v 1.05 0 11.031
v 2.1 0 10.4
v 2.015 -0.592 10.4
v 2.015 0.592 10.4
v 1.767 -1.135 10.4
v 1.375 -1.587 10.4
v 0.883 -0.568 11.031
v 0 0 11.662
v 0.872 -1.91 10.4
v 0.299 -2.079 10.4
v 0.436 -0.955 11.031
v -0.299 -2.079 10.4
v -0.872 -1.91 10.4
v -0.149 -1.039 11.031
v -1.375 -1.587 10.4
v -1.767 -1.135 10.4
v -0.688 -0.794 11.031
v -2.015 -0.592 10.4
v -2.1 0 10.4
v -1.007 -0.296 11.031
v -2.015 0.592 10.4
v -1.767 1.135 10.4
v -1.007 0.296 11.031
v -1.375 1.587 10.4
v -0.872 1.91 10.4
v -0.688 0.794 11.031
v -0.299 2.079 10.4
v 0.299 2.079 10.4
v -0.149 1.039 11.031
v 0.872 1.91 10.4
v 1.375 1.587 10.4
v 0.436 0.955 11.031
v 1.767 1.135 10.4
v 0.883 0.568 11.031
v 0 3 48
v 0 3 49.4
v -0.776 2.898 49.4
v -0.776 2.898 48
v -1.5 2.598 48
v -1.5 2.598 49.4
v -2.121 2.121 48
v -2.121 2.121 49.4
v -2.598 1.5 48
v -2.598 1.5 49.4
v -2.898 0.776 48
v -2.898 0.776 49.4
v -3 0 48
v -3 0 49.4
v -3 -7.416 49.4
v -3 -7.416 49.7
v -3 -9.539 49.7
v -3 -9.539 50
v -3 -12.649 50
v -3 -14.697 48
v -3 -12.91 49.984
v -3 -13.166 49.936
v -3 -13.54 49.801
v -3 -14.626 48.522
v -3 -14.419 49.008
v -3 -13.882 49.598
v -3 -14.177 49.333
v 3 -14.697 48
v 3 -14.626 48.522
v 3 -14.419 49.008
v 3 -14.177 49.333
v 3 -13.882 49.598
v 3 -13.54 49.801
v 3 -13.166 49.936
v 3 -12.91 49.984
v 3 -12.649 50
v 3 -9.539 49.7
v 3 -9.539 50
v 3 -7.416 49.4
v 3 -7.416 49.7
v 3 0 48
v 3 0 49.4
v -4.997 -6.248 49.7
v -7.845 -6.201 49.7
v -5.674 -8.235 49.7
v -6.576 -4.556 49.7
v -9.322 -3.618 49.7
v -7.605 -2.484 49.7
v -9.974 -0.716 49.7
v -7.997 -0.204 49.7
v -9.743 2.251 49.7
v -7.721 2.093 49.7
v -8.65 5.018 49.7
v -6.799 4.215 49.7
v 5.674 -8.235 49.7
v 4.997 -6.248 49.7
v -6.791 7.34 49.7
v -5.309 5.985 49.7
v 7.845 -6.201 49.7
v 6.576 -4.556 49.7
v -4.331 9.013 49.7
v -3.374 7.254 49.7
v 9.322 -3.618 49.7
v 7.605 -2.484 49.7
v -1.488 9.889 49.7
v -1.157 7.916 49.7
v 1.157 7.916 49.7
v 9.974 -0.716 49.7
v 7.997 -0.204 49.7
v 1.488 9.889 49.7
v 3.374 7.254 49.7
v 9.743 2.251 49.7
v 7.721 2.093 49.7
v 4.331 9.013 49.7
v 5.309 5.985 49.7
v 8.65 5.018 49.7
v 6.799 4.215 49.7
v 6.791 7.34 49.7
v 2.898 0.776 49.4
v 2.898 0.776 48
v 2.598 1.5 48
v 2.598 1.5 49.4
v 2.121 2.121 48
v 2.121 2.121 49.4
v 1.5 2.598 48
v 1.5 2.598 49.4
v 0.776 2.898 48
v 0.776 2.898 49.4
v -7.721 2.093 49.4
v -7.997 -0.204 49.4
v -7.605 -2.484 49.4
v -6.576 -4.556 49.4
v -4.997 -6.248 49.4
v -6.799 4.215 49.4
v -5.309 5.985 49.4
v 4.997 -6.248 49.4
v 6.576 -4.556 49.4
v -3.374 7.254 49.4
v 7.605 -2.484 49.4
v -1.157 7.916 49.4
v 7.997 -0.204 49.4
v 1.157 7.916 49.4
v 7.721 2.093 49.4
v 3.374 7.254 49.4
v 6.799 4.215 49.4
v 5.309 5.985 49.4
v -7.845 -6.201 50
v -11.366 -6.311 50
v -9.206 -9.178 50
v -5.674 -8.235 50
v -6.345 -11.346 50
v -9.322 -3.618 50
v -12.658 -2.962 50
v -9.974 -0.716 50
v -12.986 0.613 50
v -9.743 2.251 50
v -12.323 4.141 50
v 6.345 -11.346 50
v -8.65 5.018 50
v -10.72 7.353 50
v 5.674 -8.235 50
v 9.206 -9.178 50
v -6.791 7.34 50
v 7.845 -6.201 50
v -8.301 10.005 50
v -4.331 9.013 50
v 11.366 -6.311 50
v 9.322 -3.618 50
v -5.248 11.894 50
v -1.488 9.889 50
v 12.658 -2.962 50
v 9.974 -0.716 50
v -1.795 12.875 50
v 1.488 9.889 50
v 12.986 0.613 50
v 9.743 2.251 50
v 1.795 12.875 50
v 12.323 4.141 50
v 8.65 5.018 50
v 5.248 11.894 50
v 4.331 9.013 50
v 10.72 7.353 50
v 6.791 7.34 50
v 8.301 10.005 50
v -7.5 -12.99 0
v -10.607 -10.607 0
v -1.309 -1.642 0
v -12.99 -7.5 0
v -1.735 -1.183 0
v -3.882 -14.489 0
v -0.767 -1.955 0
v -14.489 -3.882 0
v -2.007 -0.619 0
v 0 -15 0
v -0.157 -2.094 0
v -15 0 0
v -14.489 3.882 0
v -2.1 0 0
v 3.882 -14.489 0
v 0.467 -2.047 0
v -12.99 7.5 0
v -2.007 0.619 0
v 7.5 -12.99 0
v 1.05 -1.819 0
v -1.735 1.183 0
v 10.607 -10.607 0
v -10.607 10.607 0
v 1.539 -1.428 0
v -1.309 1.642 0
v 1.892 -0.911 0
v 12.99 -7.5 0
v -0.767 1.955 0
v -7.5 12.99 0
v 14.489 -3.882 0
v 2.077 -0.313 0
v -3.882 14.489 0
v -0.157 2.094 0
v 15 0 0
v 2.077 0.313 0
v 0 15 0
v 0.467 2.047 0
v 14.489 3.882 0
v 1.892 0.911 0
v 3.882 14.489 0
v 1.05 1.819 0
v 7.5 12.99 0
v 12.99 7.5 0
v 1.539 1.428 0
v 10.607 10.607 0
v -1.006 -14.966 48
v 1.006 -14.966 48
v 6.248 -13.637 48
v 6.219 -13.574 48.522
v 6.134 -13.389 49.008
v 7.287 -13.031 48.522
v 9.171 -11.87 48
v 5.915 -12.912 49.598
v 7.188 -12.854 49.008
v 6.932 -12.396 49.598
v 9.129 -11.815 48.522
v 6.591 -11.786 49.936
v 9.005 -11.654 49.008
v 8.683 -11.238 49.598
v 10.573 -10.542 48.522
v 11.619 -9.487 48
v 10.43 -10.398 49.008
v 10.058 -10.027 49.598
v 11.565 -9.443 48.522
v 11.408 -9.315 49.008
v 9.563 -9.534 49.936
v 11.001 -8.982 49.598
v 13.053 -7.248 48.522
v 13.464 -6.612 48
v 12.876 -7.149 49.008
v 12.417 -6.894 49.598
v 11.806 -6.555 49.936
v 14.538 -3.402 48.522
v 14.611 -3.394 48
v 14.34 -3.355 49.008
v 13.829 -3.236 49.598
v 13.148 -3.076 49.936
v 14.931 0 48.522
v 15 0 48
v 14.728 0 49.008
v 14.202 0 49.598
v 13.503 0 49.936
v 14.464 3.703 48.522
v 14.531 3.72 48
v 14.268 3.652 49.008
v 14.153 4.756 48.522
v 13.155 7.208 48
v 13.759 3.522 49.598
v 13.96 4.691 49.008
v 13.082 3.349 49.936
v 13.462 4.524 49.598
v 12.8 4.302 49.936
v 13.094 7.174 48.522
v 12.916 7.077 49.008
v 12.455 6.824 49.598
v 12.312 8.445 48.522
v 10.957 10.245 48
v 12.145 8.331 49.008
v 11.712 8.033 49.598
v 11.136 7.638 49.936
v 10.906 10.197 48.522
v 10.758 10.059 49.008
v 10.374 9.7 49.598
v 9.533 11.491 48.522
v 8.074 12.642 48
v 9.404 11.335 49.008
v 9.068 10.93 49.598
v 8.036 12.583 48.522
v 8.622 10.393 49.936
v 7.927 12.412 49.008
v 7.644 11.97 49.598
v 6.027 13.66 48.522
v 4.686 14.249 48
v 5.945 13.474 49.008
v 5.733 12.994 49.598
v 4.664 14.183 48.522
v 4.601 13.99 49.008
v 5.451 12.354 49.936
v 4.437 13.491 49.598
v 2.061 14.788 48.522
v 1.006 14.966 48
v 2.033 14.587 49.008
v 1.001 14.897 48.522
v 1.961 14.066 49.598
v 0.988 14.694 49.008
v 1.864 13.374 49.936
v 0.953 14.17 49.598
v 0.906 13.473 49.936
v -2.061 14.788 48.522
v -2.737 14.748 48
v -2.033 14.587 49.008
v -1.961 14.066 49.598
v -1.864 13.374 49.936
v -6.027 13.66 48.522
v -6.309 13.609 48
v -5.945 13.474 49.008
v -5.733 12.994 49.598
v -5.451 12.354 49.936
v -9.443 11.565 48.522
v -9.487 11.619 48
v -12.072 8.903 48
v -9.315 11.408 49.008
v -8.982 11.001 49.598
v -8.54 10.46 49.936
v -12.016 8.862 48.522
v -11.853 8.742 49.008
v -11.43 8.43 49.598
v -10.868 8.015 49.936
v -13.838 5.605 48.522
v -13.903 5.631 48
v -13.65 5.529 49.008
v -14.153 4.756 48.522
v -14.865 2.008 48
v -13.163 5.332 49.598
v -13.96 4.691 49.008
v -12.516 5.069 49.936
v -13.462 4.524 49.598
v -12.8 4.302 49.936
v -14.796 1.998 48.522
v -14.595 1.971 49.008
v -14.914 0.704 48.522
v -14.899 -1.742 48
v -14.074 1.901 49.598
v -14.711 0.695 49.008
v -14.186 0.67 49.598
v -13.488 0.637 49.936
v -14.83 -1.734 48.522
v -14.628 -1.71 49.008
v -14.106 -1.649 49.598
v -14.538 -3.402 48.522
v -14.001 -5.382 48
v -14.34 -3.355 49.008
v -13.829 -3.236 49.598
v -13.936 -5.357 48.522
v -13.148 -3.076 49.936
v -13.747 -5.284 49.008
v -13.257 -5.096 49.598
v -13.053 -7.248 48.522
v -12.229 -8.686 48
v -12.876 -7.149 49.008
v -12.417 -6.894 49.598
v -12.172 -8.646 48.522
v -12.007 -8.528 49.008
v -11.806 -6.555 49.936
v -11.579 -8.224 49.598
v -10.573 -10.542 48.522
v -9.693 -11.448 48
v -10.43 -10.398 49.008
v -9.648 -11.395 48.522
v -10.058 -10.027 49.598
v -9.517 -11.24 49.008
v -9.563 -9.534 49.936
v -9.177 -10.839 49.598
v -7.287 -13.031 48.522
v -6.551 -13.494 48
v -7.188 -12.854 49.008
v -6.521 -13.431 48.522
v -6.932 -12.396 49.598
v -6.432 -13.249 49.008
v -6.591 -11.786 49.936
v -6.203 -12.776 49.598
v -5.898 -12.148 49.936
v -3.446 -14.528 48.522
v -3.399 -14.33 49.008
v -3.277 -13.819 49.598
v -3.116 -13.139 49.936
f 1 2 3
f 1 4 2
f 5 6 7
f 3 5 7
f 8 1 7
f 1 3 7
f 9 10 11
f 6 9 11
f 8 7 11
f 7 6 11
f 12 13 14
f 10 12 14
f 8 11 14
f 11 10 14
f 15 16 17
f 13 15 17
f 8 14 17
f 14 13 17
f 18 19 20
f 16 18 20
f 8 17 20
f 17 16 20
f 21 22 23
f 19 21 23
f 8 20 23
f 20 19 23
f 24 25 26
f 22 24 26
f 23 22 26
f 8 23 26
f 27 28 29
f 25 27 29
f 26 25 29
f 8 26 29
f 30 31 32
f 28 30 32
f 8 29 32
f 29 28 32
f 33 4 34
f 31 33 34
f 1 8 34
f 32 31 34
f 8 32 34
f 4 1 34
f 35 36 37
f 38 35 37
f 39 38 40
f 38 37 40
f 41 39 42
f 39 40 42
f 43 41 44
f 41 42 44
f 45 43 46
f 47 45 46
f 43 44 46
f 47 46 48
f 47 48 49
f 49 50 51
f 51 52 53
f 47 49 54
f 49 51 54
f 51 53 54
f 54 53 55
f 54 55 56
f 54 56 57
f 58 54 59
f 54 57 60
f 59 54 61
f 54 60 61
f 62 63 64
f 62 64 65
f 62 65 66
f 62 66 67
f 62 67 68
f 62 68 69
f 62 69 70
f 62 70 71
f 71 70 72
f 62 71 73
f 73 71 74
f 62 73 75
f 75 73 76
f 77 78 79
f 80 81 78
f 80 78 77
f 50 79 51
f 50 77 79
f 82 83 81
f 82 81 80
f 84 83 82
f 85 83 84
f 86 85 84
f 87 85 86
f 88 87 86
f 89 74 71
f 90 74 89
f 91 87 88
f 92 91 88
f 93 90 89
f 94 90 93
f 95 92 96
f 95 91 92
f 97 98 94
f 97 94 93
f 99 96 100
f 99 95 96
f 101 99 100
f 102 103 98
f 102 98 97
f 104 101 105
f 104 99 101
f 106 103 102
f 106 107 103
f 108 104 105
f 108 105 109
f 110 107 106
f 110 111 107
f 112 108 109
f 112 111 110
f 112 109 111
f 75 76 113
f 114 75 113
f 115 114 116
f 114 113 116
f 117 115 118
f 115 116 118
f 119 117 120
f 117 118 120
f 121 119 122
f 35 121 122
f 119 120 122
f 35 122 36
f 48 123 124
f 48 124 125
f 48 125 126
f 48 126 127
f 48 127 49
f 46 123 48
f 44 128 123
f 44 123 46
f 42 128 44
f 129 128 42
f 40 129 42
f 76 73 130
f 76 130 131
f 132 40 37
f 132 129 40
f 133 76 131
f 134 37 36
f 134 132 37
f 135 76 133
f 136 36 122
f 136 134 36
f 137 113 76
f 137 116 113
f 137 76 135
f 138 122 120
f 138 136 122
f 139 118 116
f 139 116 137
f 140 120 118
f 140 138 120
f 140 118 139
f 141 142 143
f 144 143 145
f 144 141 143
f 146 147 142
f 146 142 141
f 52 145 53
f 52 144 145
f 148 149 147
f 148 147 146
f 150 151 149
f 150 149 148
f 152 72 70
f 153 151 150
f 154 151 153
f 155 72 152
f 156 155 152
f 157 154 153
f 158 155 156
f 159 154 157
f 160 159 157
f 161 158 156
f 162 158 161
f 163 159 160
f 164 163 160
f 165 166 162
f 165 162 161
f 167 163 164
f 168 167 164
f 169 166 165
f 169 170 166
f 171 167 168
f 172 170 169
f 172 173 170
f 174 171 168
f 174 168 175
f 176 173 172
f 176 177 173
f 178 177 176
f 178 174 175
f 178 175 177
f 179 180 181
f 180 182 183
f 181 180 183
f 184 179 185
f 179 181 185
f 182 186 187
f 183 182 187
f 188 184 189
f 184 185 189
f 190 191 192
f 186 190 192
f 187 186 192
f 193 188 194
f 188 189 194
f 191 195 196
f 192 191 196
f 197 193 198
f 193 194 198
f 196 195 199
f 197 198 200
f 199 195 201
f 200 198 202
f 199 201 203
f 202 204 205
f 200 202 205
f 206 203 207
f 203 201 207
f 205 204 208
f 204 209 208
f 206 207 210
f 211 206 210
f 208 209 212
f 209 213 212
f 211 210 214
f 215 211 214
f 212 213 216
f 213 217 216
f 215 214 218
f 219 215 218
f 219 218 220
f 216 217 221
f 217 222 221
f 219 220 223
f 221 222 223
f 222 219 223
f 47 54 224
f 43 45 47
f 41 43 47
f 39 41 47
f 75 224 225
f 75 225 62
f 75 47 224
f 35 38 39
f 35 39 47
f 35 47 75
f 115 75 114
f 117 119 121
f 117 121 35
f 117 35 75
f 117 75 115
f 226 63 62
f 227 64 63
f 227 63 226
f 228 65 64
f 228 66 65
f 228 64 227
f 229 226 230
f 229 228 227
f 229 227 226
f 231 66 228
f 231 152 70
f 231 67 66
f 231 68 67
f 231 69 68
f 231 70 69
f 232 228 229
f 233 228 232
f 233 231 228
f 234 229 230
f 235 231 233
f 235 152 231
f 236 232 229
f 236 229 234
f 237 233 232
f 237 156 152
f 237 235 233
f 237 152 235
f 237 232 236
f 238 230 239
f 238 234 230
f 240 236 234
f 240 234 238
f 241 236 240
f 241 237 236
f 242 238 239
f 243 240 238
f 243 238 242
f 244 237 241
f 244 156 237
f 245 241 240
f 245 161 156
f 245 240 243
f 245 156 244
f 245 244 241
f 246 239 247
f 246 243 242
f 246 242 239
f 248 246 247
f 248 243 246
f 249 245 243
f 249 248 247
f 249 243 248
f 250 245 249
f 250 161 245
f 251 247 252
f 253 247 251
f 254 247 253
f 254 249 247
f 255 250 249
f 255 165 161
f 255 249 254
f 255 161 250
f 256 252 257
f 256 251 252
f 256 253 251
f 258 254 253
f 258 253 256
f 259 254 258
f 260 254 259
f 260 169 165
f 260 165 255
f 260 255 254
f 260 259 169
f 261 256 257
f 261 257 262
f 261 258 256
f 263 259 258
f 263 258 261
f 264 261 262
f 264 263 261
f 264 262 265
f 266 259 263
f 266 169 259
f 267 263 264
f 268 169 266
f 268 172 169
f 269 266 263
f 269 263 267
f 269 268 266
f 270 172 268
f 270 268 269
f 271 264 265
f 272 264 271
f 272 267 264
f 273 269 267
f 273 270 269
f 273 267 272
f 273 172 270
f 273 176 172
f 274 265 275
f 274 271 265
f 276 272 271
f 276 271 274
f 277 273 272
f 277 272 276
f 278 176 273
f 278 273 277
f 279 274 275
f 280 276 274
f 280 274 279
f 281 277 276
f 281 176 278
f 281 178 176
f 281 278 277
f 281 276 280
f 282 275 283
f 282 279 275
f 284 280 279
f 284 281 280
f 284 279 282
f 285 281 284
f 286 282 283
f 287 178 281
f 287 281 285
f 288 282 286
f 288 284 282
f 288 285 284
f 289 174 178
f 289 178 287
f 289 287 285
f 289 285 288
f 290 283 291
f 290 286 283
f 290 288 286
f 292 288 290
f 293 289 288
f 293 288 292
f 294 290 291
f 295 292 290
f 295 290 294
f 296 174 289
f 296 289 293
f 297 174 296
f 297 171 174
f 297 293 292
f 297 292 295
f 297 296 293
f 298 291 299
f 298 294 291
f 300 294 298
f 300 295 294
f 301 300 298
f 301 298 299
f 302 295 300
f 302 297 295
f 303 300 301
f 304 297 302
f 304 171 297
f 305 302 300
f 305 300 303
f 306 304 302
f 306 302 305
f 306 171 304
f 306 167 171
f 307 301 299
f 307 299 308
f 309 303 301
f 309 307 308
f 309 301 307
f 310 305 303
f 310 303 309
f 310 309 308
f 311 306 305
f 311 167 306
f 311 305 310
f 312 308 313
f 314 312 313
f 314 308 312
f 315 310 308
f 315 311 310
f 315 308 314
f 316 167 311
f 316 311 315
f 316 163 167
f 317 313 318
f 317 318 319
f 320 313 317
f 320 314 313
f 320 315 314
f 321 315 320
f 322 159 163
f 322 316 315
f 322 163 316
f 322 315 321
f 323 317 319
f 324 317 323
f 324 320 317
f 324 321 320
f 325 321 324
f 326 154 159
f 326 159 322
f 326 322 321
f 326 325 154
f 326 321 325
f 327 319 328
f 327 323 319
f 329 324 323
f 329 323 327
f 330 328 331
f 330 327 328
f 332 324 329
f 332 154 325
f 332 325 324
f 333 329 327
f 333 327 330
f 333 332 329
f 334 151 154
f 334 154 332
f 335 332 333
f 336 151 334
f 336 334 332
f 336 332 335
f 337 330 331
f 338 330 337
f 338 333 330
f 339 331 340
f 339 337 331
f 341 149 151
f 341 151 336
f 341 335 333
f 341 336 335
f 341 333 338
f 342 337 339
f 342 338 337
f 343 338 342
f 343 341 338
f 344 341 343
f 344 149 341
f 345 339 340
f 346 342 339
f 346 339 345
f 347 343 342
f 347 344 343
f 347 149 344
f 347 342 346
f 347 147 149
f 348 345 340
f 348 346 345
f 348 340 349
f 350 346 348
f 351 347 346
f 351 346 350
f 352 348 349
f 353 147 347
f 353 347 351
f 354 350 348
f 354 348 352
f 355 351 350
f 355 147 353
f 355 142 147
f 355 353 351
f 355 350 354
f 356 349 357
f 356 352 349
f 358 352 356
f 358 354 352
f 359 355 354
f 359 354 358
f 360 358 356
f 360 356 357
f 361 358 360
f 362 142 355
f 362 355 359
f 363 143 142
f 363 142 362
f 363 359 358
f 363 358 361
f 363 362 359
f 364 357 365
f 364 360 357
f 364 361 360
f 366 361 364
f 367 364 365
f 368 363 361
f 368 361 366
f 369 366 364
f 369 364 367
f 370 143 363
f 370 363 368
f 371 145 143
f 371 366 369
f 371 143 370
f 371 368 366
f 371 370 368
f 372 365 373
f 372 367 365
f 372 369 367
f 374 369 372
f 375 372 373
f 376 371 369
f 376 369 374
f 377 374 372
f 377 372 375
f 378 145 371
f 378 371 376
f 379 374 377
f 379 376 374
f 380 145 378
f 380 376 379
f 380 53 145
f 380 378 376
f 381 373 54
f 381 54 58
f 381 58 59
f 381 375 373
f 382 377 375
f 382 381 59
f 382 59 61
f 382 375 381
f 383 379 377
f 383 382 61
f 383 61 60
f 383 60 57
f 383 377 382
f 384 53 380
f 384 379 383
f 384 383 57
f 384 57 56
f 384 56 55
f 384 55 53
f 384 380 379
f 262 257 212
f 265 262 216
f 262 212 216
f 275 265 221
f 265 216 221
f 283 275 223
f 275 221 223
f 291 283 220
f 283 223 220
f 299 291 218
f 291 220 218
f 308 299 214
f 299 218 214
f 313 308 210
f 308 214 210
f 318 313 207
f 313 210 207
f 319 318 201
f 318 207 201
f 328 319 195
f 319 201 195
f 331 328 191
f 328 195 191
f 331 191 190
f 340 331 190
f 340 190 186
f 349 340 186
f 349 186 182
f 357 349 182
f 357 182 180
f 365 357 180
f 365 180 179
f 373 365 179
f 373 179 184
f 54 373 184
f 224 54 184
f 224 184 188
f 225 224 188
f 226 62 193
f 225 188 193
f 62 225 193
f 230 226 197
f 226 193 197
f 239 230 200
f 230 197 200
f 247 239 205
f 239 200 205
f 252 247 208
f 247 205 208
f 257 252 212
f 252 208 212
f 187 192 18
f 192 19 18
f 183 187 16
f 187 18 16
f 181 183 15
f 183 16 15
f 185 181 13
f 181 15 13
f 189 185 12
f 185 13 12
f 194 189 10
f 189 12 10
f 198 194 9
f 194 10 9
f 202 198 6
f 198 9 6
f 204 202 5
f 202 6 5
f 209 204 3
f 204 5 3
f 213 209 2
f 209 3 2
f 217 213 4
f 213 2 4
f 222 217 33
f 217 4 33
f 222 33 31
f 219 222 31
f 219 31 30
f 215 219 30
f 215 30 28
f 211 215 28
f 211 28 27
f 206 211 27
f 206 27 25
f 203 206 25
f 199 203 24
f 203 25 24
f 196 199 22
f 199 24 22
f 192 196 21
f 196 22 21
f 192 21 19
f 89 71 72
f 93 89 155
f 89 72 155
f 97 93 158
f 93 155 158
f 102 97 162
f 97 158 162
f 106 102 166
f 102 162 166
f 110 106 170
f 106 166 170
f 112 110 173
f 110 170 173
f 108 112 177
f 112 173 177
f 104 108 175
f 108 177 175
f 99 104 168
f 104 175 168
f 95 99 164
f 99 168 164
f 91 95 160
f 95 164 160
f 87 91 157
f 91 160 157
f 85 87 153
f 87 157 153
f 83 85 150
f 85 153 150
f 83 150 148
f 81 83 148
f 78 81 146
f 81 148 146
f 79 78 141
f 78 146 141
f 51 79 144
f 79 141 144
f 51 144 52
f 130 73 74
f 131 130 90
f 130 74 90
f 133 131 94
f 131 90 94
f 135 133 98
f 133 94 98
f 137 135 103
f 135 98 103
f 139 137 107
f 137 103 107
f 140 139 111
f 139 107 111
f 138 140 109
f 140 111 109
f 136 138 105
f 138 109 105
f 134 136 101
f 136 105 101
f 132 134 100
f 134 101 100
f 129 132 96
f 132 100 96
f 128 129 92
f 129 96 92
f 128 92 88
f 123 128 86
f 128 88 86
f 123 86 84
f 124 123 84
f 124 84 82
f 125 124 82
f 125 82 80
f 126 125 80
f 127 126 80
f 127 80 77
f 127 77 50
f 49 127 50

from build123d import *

# Parameters (mm, degrees)
F0_R      = 15
F1_DEPTH  = 50
F2_R      = 2
F3_R      = 10
F4_DEPTH  = 0.3
F6_DEPTH  = 2
F8_D      = 4.2
F8_DEPTH  = 10.4
F8_TIP    = 1.2618073
F9_R      = 8
F10_DEPTH = 0.3


with BuildPart() as f1:
    # F0 (on Top) → F1 (new body)
    with BuildSketch(Plane.XY):
        Circle(F0_R)
    extrude(amount=F1_DEPTH)

    # F2
    f2_edges = [f1.edges().sort_by_distance(p)[0] for p in [
        (-15, 0, 50),
    ]]
    fillet(f2_edges, radius=F2_R)

    # F3 (on face) → F4 (cut)
    with BuildSketch(Plane.XY.offset(50)):
        Circle(F3_R)
    extrude(amount=-F4_DEPTH, mode=Mode.SUBTRACT)

    # F5 (on face) → F6 (cut)
    with BuildSketch(Plane.XY.offset(50)):
        with BuildLine():
            Line((-3, 0), (-3, -9.5393920142))
            ThreePointArc((-3, -9.5393920142), (0, -10), (3, -9.5393920142))
            Line((3, -9.5393920142), (3, 0))
            ThreePointArc((3, 0), (2.1213203436, 2.1213203436), (0, 3))
            ThreePointArc((0, 3), (-2.1213203436, 2.1213203436), (-3, 0))
        make_face()
        with BuildLine():
            Line((-3, -9.5393920142), (-3, -12.6491106407))
            ThreePointArc((-3, -12.6491106407), (0, -13), (3, -12.6491106407))
            Line((3, -12.6491106407), (3, -9.5393920142))
            ThreePointArc((3, -9.5393920142), (0, -10), (-3, -9.5393920142))
        make_face()
        with BuildLine():
            Line((-3, -12.6491106407), (-3, -27))
            Line((-3, -27), (3, -27))
            Line((3, -27), (3, -12.6491106407))
            ThreePointArc((3, -12.6491106407), (0, -13), (-3, -12.6491106407))
        make_face()
    extrude(amount=-F6_DEPTH, mode=Mode.SUBTRACT)

    # F8
    with Locations(Plane(origin=(0, 0, 0), x_dir=(1, 0, 0), z_dir=(0, 0, -1))):
        with Locations((0, 0)):
            Hole(F8_D / 2, depth=F8_DEPTH)
            with Locations((0, 0, -(F8_DEPTH + F8_TIP / 2))):  # 118° drill point
                Cone(0, F8_D / 2, F8_TIP, mode=Mode.SUBTRACT)

    # F9 (on face) → F10 (cut)
    with BuildSketch(Plane.XY.offset(49.7)):
        Circle(F9_R)
    extrude(amount=-F10_DEPTH, mode=Mode.SUBTRACT)


solid = f1.part
